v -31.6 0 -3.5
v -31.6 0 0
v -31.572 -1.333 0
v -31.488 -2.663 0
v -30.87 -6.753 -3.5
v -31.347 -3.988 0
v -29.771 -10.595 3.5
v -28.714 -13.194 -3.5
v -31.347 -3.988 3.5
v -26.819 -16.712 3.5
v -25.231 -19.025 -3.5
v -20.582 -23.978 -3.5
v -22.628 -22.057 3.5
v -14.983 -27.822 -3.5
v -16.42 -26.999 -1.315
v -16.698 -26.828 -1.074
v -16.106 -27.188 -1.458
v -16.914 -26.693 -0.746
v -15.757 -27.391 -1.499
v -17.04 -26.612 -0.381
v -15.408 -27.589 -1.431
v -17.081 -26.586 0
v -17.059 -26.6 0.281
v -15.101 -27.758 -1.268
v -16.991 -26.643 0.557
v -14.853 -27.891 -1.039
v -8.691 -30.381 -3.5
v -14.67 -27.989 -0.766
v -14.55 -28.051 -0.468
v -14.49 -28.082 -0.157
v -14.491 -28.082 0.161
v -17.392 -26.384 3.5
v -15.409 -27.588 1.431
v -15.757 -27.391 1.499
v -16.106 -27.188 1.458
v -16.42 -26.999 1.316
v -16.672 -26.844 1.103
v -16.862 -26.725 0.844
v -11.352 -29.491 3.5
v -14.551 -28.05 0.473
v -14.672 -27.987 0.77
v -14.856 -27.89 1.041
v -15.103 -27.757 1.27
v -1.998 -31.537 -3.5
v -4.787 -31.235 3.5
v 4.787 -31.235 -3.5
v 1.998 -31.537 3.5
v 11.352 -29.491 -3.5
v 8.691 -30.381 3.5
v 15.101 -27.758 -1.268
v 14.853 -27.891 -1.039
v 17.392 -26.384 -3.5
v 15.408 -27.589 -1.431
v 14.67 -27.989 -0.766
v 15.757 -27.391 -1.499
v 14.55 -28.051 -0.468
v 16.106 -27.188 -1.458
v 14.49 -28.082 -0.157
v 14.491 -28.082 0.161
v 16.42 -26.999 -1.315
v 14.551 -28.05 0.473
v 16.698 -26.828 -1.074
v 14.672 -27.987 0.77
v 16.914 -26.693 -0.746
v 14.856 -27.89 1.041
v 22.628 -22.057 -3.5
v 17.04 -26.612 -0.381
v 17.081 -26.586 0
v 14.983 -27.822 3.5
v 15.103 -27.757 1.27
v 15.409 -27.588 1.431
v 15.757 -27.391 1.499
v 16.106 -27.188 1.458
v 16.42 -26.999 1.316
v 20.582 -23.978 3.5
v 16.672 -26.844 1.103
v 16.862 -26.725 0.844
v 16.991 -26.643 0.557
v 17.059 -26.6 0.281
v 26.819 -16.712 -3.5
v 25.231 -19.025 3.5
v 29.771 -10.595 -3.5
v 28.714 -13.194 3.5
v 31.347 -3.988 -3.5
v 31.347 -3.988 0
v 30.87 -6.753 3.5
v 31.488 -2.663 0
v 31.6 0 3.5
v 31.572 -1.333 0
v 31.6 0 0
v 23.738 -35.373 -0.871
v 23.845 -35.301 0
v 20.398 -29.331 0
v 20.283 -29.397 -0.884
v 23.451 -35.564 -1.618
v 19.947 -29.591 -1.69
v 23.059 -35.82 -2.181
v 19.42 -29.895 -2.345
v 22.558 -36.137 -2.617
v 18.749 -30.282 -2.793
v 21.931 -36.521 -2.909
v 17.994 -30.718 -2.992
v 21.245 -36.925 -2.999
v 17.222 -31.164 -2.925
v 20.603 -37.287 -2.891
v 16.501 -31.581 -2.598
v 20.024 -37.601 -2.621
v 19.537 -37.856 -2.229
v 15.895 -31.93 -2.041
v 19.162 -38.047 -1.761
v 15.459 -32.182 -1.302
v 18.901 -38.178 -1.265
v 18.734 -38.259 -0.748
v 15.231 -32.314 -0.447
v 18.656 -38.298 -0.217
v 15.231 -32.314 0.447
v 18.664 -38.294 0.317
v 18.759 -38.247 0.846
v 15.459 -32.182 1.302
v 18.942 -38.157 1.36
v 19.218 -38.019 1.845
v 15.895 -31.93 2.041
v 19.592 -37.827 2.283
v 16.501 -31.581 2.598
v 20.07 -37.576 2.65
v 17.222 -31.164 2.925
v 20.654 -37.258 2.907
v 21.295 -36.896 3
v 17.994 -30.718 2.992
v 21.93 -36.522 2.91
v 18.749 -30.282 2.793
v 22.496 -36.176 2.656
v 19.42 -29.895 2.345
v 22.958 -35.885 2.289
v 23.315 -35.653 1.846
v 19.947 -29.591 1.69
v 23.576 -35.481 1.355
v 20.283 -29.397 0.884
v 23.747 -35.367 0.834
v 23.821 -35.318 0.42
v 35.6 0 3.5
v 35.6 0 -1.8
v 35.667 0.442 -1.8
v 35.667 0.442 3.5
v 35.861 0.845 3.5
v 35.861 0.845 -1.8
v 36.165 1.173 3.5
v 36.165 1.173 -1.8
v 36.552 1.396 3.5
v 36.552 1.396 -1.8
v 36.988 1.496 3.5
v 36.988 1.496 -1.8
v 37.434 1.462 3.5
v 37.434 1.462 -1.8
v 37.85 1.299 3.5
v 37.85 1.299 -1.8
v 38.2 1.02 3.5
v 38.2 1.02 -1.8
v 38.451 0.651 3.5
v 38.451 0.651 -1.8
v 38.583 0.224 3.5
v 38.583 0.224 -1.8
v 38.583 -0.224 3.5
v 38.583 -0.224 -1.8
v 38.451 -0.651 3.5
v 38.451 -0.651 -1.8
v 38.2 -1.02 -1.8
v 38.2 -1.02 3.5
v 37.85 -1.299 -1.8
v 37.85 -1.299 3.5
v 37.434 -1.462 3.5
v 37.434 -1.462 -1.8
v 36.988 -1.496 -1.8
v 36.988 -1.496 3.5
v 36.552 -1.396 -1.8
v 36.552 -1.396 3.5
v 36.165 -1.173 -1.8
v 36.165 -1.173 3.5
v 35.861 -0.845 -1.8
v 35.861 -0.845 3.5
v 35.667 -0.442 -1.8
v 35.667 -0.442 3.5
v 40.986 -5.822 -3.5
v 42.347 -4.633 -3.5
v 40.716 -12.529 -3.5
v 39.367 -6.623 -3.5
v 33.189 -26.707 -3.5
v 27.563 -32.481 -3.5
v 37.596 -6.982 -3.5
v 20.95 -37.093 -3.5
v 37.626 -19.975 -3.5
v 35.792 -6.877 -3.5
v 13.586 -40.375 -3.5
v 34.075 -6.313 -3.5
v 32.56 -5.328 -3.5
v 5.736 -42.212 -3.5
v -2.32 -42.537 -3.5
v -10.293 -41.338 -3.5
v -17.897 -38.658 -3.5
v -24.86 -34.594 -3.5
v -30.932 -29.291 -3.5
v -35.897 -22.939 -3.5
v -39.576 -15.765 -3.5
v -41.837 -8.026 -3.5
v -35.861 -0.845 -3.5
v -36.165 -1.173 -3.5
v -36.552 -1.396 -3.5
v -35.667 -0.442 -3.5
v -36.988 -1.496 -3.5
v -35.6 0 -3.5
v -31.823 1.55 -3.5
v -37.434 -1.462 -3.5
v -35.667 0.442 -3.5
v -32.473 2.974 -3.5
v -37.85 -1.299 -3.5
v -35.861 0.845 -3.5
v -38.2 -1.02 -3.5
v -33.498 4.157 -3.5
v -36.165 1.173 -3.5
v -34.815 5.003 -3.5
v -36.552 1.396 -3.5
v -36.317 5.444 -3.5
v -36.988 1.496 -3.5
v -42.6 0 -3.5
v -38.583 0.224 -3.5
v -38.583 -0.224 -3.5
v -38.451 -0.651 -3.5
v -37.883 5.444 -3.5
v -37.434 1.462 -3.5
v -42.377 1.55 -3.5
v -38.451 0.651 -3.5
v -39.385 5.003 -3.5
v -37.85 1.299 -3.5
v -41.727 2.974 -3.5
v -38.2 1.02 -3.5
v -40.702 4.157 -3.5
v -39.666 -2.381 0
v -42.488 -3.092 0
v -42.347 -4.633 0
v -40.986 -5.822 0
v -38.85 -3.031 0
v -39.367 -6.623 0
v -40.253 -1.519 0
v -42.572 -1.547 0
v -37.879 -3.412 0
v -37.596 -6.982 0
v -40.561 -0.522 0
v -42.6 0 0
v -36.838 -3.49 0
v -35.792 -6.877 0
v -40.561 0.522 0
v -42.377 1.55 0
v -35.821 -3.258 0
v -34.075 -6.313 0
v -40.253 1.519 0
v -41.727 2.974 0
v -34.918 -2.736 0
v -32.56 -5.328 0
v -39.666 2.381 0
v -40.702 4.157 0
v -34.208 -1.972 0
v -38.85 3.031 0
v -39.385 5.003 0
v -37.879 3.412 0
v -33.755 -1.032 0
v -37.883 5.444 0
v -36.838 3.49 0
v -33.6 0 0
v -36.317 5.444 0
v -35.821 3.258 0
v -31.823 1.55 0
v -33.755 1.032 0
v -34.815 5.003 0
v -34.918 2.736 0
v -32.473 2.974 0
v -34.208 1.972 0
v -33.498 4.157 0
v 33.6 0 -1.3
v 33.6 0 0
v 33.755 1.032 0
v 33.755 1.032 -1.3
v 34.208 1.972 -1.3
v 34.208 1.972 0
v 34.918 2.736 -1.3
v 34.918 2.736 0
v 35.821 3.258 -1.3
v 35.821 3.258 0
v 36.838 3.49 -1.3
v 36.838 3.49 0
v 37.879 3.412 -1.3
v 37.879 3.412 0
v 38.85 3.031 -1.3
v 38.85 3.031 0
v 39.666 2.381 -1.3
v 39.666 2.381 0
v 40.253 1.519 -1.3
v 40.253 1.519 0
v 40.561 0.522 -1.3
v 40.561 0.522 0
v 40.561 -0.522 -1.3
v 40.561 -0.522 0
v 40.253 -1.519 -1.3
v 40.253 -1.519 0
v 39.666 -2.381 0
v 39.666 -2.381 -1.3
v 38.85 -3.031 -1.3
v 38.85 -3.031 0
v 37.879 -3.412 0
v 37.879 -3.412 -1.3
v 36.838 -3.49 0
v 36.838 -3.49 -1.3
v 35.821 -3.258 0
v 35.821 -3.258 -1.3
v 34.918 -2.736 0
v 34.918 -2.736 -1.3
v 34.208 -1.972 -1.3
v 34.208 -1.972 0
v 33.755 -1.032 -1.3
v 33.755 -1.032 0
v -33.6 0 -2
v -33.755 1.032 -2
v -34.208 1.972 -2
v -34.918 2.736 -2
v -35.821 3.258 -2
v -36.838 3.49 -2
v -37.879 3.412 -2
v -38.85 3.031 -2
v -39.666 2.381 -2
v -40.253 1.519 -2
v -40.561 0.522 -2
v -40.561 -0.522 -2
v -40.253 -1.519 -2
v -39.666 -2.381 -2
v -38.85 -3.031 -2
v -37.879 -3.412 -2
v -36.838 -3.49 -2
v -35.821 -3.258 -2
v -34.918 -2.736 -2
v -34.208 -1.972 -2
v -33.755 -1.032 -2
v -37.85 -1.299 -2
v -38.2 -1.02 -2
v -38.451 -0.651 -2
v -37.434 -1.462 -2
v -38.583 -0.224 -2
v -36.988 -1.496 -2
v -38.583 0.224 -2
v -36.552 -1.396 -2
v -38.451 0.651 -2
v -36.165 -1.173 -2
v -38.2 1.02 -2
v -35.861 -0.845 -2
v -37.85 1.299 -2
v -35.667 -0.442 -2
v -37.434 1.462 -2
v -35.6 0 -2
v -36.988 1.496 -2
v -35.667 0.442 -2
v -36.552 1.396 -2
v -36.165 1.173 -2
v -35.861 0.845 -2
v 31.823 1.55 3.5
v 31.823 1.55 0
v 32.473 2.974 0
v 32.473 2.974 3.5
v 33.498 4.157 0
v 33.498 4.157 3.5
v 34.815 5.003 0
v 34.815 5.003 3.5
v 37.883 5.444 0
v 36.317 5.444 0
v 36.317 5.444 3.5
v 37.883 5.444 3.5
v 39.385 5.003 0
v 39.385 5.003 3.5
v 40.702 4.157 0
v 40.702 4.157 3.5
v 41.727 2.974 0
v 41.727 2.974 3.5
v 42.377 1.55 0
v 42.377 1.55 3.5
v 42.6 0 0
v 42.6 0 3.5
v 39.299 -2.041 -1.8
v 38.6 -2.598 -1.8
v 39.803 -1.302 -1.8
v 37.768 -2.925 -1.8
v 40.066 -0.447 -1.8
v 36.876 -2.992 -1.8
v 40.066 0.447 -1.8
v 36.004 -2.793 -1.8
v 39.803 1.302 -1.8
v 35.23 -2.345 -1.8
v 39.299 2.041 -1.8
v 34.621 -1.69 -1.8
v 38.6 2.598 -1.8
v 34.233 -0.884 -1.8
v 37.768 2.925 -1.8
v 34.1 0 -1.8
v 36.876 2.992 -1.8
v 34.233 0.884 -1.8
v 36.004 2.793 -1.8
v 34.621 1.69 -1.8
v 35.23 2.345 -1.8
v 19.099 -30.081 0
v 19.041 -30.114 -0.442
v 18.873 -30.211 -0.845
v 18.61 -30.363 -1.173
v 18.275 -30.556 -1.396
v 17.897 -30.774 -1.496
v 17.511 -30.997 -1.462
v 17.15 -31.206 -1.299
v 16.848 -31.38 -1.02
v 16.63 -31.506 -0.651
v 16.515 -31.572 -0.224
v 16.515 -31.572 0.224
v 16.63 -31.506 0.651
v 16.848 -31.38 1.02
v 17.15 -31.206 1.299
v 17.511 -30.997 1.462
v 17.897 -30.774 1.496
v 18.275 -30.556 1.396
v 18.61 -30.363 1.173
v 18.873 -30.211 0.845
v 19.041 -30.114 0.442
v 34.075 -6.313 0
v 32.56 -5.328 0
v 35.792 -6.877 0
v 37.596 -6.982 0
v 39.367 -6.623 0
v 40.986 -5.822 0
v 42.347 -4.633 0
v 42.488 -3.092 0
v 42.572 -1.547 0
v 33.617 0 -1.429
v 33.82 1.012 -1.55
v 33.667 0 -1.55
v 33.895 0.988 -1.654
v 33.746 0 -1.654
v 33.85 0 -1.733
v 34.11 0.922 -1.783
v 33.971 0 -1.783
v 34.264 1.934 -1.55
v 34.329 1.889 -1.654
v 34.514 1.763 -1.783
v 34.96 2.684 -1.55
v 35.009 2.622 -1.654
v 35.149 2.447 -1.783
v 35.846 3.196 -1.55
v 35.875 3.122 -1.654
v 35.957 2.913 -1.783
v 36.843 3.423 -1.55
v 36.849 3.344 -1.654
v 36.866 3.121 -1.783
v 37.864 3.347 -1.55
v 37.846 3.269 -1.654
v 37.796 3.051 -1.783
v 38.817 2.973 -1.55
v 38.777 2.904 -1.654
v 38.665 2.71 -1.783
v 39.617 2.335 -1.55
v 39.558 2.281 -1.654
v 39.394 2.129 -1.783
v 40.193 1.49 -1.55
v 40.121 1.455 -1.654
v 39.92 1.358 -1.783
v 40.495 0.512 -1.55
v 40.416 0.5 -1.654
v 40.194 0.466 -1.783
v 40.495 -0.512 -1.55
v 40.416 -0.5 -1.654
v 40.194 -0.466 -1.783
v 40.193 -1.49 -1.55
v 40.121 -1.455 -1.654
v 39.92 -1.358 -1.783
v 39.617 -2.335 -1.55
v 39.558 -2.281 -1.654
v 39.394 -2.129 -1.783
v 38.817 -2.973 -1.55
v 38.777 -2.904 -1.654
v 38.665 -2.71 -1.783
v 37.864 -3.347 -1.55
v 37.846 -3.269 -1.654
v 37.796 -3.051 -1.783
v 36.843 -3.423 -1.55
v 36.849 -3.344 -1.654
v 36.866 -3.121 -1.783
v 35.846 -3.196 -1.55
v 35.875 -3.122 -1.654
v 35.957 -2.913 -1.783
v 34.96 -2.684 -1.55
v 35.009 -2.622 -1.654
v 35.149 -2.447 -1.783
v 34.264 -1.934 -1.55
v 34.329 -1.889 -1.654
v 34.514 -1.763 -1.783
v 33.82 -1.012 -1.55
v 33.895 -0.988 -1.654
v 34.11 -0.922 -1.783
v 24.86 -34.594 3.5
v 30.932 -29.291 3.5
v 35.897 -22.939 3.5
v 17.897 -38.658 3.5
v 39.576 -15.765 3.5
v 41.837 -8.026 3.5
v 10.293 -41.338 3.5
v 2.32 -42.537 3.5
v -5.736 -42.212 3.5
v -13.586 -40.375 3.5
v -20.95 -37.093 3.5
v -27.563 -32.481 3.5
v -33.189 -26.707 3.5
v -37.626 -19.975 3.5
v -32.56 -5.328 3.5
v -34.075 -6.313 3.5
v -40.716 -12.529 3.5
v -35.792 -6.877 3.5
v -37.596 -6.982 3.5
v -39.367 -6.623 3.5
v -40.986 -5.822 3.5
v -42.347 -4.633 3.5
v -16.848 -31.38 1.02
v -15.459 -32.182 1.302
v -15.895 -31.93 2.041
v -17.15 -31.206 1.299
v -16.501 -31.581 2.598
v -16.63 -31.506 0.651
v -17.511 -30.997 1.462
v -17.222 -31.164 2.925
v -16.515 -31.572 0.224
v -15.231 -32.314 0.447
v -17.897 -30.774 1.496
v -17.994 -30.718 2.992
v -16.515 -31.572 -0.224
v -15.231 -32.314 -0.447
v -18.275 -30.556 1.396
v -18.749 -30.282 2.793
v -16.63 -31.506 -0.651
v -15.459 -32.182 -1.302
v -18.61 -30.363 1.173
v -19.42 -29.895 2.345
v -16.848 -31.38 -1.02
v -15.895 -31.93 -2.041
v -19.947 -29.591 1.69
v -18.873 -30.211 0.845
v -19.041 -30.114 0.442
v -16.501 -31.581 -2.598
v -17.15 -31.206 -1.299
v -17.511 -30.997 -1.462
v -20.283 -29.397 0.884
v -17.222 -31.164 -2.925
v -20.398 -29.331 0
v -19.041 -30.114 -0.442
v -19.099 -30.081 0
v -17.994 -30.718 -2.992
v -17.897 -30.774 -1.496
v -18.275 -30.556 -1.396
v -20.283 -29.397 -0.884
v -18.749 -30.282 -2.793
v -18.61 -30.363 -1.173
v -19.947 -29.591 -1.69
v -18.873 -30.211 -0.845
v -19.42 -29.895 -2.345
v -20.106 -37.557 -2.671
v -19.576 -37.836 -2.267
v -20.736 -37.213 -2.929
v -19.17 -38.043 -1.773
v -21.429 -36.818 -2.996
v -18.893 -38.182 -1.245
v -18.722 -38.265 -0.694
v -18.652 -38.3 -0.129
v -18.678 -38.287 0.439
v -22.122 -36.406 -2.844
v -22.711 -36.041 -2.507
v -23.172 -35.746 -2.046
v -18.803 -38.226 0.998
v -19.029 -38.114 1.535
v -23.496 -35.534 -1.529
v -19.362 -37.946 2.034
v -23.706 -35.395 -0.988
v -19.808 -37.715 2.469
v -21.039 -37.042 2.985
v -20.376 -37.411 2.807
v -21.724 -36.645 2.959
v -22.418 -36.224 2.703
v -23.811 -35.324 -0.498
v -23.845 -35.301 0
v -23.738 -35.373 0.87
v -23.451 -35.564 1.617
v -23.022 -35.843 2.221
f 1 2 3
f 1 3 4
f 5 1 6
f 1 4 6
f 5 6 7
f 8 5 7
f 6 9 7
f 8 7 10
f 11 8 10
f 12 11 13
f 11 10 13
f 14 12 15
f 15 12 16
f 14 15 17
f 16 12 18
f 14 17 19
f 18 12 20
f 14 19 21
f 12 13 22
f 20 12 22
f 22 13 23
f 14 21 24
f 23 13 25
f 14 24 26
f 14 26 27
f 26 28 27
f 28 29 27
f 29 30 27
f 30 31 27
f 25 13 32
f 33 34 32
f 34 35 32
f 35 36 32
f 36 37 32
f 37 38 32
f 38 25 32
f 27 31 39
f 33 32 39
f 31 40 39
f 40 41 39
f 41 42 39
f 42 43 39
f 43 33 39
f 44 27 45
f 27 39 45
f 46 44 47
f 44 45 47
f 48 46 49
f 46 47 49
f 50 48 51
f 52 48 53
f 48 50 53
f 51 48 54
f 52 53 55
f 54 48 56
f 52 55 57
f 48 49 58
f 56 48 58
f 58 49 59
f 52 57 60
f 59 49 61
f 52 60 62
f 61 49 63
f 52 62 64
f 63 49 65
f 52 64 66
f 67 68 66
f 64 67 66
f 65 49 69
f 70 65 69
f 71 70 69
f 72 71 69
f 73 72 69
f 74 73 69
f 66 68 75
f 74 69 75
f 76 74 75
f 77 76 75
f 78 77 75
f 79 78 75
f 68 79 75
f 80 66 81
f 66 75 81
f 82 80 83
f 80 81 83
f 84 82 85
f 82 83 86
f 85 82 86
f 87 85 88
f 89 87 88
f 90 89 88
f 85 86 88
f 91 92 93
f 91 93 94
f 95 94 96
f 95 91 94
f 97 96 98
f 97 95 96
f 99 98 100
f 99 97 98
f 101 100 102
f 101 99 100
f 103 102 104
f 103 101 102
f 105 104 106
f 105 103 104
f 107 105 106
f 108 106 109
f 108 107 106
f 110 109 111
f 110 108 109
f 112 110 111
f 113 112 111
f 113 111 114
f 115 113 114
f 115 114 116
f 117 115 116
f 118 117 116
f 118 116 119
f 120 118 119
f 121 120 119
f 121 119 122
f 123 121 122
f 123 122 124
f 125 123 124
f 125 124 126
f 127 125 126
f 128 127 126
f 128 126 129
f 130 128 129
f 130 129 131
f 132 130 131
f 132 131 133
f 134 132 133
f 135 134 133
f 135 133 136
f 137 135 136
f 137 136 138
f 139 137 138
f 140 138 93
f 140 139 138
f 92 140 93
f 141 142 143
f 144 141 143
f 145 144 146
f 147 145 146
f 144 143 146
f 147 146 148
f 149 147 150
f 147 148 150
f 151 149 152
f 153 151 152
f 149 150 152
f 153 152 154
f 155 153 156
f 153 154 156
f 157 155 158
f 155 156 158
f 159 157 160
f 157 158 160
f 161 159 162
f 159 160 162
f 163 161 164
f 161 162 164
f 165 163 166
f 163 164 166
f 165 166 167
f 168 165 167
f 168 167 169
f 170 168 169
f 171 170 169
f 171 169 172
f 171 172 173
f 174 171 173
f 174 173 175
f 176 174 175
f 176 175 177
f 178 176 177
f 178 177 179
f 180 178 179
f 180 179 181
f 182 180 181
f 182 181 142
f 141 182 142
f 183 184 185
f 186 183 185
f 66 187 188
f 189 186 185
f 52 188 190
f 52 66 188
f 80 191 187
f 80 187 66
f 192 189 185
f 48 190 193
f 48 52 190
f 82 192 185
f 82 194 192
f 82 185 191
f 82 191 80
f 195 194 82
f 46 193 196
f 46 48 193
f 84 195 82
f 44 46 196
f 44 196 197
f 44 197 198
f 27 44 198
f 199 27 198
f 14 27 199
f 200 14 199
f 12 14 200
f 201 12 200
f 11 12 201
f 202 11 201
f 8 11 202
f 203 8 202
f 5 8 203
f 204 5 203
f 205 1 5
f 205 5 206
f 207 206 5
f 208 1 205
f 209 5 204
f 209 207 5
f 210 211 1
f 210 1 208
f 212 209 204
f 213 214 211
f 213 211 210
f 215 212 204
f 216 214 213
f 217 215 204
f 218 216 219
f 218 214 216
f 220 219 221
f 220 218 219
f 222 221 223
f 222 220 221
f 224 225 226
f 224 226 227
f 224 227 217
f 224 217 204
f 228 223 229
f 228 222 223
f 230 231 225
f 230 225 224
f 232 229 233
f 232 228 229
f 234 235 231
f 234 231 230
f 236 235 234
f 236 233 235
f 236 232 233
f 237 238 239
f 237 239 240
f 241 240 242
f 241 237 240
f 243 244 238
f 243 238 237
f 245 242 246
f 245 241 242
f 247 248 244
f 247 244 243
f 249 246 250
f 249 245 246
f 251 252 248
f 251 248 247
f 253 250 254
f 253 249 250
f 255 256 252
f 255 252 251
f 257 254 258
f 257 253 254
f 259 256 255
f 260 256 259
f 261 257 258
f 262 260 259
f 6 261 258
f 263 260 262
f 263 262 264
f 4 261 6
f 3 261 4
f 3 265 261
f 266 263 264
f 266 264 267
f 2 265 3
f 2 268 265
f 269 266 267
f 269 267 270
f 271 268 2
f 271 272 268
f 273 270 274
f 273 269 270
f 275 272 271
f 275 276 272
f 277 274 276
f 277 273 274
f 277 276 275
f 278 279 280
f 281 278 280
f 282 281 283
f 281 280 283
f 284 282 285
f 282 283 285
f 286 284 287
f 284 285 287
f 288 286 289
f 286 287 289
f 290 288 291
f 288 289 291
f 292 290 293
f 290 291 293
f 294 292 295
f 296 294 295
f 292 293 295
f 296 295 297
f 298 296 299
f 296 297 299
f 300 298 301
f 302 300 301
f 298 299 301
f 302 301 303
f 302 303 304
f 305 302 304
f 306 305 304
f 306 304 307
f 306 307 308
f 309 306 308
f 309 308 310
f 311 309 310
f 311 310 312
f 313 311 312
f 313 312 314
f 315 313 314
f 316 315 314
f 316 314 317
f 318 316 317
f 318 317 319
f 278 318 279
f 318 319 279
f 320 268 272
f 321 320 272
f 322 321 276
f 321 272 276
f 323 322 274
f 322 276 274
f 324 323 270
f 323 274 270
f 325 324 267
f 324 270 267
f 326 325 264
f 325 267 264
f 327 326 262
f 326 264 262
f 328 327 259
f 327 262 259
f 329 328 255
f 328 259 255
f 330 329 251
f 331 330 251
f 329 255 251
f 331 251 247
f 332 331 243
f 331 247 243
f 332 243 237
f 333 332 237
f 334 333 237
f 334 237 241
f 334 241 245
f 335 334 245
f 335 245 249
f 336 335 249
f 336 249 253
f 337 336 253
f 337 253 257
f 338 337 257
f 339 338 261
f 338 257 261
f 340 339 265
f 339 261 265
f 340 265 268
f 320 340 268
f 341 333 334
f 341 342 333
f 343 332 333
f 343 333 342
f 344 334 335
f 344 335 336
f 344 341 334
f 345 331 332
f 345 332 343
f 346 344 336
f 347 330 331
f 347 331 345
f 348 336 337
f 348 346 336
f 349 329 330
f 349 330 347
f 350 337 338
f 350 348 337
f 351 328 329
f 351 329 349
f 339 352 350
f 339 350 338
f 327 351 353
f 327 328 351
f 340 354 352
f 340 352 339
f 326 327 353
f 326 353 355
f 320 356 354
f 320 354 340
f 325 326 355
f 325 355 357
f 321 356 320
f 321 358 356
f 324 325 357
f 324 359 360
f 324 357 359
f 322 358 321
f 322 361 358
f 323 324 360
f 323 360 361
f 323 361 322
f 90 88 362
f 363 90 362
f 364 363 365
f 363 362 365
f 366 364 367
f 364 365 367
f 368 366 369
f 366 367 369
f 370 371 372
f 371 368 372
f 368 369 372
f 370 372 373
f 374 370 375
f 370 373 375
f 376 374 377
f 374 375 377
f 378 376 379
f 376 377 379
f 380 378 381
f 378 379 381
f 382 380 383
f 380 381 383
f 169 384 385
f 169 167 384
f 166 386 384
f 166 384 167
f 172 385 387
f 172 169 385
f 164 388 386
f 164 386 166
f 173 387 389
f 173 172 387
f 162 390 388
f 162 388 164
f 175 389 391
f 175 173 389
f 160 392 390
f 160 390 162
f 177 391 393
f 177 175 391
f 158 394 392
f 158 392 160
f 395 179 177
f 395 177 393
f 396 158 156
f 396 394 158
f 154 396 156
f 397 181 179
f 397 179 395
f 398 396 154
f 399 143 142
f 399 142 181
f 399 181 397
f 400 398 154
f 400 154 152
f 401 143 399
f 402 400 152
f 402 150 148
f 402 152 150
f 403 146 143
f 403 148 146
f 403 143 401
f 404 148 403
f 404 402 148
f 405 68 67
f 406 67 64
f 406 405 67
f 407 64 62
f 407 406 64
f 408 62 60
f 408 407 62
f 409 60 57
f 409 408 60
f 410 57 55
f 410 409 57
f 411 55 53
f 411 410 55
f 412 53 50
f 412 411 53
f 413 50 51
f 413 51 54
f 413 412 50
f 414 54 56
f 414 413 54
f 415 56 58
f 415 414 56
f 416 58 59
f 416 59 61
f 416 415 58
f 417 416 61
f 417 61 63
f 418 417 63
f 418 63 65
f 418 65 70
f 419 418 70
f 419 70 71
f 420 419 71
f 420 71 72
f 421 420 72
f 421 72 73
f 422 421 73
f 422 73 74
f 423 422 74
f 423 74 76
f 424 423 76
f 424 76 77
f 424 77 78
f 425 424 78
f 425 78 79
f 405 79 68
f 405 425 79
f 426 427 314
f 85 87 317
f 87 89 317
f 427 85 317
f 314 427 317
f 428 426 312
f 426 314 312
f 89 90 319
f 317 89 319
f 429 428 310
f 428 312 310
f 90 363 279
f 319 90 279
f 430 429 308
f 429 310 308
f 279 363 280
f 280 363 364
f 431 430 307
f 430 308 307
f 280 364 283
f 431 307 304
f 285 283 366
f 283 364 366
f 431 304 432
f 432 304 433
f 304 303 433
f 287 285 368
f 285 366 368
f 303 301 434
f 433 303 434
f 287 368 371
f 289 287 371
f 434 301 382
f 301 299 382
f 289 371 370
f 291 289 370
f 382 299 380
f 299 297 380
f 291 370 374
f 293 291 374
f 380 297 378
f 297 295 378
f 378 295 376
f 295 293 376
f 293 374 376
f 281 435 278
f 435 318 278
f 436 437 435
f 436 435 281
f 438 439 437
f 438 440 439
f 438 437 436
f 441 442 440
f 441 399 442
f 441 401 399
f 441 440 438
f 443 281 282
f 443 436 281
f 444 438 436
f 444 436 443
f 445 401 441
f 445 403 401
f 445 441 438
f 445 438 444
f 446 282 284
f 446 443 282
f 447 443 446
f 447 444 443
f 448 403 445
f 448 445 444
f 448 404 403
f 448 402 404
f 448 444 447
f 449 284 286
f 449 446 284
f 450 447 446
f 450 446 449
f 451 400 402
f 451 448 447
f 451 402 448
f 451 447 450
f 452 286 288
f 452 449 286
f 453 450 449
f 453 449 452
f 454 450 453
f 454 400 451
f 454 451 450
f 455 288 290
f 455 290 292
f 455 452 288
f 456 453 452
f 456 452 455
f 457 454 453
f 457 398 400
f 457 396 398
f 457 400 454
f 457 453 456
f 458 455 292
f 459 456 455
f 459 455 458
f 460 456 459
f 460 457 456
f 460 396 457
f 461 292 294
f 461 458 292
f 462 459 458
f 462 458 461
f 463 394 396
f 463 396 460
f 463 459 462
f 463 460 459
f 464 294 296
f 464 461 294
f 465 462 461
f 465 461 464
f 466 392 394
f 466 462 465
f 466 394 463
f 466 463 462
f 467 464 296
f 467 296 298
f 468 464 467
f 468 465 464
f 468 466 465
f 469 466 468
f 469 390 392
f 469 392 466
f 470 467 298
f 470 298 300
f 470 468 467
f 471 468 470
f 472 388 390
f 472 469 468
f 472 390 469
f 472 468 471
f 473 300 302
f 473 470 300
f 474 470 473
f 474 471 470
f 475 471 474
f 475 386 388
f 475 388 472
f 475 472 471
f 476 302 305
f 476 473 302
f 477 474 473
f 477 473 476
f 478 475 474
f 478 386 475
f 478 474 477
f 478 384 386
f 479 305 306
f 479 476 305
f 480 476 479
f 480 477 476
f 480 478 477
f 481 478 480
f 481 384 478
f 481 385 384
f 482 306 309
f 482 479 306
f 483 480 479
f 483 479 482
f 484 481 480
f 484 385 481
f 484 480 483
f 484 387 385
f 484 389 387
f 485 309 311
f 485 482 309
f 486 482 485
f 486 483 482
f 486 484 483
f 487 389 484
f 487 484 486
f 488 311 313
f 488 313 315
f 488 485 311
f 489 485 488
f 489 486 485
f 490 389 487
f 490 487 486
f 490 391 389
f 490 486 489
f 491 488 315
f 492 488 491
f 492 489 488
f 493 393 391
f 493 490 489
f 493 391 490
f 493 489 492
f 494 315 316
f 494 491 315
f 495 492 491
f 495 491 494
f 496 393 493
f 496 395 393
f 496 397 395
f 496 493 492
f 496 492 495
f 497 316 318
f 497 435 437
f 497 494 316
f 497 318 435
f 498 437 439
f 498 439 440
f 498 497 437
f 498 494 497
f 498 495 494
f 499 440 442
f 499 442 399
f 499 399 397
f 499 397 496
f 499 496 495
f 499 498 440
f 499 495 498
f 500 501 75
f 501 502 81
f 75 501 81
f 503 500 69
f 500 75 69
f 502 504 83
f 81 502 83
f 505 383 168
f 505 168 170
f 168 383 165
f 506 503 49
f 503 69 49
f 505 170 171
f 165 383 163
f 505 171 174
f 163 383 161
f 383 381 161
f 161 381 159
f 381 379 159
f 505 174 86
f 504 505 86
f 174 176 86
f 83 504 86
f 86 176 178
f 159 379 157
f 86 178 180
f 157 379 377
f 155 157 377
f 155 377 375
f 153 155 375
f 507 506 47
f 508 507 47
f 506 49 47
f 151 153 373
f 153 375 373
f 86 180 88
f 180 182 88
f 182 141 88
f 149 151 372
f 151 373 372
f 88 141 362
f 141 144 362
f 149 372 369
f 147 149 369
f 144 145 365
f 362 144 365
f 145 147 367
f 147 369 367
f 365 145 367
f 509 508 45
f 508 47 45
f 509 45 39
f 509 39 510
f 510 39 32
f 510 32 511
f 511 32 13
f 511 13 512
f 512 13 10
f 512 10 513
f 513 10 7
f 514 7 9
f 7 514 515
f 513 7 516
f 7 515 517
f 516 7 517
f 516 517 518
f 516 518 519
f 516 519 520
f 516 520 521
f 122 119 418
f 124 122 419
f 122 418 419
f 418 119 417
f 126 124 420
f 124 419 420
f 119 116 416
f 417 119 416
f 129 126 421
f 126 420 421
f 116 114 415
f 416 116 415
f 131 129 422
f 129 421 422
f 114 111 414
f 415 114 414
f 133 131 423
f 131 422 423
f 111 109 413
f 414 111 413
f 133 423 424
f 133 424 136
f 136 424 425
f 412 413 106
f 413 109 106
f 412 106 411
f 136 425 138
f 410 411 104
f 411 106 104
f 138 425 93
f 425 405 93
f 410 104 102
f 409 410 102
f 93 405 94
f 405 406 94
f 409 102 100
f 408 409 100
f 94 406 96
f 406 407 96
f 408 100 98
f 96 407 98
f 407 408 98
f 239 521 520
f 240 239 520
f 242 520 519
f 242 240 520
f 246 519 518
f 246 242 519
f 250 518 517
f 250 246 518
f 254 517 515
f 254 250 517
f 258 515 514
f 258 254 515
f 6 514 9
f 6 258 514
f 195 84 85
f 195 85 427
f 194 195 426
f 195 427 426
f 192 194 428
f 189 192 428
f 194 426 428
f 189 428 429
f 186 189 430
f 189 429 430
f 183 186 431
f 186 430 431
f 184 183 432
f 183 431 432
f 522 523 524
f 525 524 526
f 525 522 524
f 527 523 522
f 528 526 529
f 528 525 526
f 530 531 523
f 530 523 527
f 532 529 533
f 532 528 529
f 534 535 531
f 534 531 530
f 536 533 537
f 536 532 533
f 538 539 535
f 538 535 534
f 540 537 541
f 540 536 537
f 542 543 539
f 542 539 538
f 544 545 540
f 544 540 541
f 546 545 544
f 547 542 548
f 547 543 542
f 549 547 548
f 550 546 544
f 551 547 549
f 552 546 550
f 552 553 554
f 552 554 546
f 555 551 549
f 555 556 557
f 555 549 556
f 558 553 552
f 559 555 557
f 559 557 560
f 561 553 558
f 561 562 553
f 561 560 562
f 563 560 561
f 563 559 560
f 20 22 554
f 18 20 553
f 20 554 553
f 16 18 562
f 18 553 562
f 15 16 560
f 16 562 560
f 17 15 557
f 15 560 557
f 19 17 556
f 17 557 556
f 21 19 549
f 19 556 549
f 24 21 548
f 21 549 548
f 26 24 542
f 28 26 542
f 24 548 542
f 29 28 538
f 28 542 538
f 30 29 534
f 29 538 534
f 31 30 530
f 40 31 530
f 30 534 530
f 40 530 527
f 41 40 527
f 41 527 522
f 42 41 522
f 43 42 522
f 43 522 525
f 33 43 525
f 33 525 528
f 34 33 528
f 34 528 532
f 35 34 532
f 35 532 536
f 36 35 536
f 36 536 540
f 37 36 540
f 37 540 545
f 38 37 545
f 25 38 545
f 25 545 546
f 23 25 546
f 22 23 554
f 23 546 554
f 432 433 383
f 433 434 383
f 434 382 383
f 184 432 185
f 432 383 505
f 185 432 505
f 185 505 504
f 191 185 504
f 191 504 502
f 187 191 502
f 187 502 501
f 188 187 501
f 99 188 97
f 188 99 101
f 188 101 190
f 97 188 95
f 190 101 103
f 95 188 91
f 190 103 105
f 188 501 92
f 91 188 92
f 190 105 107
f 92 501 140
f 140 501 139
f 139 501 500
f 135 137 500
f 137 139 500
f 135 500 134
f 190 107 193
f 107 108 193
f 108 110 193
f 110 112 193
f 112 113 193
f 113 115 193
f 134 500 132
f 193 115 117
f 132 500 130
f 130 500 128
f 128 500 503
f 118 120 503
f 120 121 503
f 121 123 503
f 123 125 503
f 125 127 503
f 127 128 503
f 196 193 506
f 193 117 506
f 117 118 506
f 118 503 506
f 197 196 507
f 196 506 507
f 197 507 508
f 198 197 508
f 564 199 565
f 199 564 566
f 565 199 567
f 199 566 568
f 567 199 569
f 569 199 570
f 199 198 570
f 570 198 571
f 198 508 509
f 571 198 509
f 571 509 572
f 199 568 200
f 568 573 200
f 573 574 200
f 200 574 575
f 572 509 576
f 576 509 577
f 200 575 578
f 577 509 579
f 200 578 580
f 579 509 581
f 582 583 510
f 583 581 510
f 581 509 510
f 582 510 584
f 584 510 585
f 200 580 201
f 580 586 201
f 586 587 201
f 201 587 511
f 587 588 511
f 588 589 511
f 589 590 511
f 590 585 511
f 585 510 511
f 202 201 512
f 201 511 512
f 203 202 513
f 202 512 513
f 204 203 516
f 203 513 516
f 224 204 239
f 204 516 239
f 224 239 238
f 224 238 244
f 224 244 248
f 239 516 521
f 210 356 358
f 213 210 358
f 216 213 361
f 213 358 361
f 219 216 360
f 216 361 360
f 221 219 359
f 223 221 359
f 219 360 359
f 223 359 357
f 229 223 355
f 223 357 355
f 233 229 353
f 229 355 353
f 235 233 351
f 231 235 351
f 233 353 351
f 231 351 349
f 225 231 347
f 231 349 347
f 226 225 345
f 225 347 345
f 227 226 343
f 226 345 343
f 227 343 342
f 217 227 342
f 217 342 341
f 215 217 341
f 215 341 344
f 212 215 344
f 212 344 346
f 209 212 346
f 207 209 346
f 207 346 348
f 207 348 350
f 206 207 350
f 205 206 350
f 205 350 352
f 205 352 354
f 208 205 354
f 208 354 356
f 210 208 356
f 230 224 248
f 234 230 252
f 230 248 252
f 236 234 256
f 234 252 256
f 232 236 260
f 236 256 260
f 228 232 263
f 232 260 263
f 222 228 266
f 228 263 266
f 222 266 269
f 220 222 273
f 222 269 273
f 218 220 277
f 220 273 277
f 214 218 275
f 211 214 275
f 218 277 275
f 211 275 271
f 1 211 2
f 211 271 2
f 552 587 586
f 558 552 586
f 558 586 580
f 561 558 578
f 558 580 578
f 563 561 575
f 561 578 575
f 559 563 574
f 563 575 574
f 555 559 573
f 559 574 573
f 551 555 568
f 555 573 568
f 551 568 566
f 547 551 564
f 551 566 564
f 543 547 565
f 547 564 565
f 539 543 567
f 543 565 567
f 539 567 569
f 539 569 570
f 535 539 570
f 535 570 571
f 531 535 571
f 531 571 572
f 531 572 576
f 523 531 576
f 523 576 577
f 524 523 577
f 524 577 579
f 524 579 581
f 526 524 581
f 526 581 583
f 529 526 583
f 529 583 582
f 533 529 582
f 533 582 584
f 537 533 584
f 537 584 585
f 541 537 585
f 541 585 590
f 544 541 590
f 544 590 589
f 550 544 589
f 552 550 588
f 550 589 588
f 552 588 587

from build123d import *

# Parameters (mm, degrees)
BOSS_EXTRUDE1_DEPTH = 3.5
SKETCH8_R           = 1.5
CUT_EXTRUDE7_DEPTH  = 77.763269239
SKETCH9_R           = 3
CUT_EXTRUDE8_DEPTH  = 7
SKETCH10_R          = 7
CUT_EXTRUDE9_DEPTH  = 61.347079612
SKETCH10_3_R        = 7
CUT_EXTRUDE10_DEPTH = 61.347079612
SKETCH11_R          = 3.5
CUT_EXTRUDE11_DEPTH = 2
SKETCH12_R          = 1.5
CUT_EXTRUDE12_DEPTH = 61.496033078
SKETCH13_R          = 3.5
BOSS_EXTRUDE3_DEPTH = 1.8
SKETCH14_R          = 1.5
CUT_EXTRUDE13_DEPTH = 61.478178032
FILLET1_R           = 0.5


with BuildPart() as part:
    # Sketch1 → Boss-Extrude1 (new, symmetric)
    with BuildSketch(Plane.XY):
        with BuildLine():
            ThreePointArc((-31.6, 0), (0, -31.6), (31.6, 0))
            ThreePointArc((31.6, 0), (37.1, 5.5), (42.6, 0))
            ThreePointArc((42.6, 0), (0, -42.6), (-42.6, 0))
            ThreePointArc((-42.6, 0), (-37.1, 5.5), (-31.6, 0))
        make_face()
    extrude(amount=BOSS_EXTRUDE1_DEPTH, both=True)

    # Sketch8 → Cut-Extrude7 (cut, through all)
    with BuildSketch(Plane(origin=(-21.3, -36.892682201, 0), x_dir=(-0.8660254037844363, 0.5000000000000042, 0), z_dir=(-0.5000000000000041, -0.8660254037844362, 0))):
        Circle(SKETCH8_R)
    cut_extrude7 = extrude(amount=-CUT_EXTRUDE7_DEPTH, mode=Mode.SUBTRACT)

    # Sketch9 → Cut-Extrude8 (cut)
    with BuildSketch(Plane(origin=(-21.3, -36.892682201, 0), x_dir=(-0.8660254037844363, 0.5000000000000042, 0), z_dir=(-0.5000000000000041, -0.8660254037844362, 0))):
        Circle(SKETCH9_R)
    cut_extrude8 = extrude(amount=-CUT_EXTRUDE8_DEPTH, mode=Mode.SUBTRACT)

    # Mirror1: Cut-Extrude7, Cut-Extrude8 across plane
    add(cut_extrude7.mirror(Plane(origin=(0, 0, 0), x_dir=(0, 0, 1), z_dir=(1, 0, 0))), mode=Mode.SUBTRACT)
    add(cut_extrude8.mirror(Plane(origin=(0, 0, 0), x_dir=(0, 0, 1), z_dir=(1, 0, 0))), mode=Mode.SUBTRACT)

    # Sketch10 → Cut-Extrude9 (cut, through all)
    with BuildSketch(Plane.XY):
        with Locations((-37.1, 0)):
            Circle(SKETCH10_R)
    extrude(amount=CUT_EXTRUDE9_DEPTH, mode=Mode.SUBTRACT)

    # Sketch10<3> → Cut-Extrude10 (cut, through all)
    with BuildSketch(Plane.XY):
        with Locations((37.1, 0)):
            Circle(SKETCH10_3_R)
    extrude(amount=-CUT_EXTRUDE10_DEPTH, mode=Mode.SUBTRACT)

    # Sketch11 → Cut-Extrude11 (cut)
    with BuildSketch(Plane.XY):
        with Locations((-37.1, 0)):
            Circle(SKETCH11_R)
    extrude(amount=-CUT_EXTRUDE11_DEPTH, mode=Mode.SUBTRACT)

    # Sketch12 → Cut-Extrude12 (cut, through all)
    with BuildSketch(Plane.XY.offset(-2)):
        with Locations((-37.1, 0)):
            Circle(SKETCH12_R)
    extrude(amount=-CUT_EXTRUDE12_DEPTH, mode=Mode.SUBTRACT)

    # Sketch13 → Boss-Extrude3 (add)
    with BuildSketch(Plane(origin=(0, 0, 0), x_dir=(-1, 0, 0), z_dir=(0, 0, -1))):
        with Locations((-37.1, 0)):
            Circle(SKETCH13_R)
    extrude(amount=BOSS_EXTRUDE3_DEPTH)

    # Sketch14 → Cut-Extrude13 (cut, through all)
    with BuildSketch(Plane(origin=(0, 0, -1.8), x_dir=(-1, 0, 0), z_dir=(0, 0, -1))):
        with Locations((-37.1, 0)):
            Circle(SKETCH14_R)
    extrude(amount=-CUT_EXTRUDE13_DEPTH, mode=Mode.SUBTRACT)

    # Fillet1
    fillet1_edges = [part.edges().sort_by_distance(p)[0] for p in [
        (40.6, 0, -1.8),
    ]]
    fillet(fillet1_edges, radius=FILLET1_R)


solid = part.part
